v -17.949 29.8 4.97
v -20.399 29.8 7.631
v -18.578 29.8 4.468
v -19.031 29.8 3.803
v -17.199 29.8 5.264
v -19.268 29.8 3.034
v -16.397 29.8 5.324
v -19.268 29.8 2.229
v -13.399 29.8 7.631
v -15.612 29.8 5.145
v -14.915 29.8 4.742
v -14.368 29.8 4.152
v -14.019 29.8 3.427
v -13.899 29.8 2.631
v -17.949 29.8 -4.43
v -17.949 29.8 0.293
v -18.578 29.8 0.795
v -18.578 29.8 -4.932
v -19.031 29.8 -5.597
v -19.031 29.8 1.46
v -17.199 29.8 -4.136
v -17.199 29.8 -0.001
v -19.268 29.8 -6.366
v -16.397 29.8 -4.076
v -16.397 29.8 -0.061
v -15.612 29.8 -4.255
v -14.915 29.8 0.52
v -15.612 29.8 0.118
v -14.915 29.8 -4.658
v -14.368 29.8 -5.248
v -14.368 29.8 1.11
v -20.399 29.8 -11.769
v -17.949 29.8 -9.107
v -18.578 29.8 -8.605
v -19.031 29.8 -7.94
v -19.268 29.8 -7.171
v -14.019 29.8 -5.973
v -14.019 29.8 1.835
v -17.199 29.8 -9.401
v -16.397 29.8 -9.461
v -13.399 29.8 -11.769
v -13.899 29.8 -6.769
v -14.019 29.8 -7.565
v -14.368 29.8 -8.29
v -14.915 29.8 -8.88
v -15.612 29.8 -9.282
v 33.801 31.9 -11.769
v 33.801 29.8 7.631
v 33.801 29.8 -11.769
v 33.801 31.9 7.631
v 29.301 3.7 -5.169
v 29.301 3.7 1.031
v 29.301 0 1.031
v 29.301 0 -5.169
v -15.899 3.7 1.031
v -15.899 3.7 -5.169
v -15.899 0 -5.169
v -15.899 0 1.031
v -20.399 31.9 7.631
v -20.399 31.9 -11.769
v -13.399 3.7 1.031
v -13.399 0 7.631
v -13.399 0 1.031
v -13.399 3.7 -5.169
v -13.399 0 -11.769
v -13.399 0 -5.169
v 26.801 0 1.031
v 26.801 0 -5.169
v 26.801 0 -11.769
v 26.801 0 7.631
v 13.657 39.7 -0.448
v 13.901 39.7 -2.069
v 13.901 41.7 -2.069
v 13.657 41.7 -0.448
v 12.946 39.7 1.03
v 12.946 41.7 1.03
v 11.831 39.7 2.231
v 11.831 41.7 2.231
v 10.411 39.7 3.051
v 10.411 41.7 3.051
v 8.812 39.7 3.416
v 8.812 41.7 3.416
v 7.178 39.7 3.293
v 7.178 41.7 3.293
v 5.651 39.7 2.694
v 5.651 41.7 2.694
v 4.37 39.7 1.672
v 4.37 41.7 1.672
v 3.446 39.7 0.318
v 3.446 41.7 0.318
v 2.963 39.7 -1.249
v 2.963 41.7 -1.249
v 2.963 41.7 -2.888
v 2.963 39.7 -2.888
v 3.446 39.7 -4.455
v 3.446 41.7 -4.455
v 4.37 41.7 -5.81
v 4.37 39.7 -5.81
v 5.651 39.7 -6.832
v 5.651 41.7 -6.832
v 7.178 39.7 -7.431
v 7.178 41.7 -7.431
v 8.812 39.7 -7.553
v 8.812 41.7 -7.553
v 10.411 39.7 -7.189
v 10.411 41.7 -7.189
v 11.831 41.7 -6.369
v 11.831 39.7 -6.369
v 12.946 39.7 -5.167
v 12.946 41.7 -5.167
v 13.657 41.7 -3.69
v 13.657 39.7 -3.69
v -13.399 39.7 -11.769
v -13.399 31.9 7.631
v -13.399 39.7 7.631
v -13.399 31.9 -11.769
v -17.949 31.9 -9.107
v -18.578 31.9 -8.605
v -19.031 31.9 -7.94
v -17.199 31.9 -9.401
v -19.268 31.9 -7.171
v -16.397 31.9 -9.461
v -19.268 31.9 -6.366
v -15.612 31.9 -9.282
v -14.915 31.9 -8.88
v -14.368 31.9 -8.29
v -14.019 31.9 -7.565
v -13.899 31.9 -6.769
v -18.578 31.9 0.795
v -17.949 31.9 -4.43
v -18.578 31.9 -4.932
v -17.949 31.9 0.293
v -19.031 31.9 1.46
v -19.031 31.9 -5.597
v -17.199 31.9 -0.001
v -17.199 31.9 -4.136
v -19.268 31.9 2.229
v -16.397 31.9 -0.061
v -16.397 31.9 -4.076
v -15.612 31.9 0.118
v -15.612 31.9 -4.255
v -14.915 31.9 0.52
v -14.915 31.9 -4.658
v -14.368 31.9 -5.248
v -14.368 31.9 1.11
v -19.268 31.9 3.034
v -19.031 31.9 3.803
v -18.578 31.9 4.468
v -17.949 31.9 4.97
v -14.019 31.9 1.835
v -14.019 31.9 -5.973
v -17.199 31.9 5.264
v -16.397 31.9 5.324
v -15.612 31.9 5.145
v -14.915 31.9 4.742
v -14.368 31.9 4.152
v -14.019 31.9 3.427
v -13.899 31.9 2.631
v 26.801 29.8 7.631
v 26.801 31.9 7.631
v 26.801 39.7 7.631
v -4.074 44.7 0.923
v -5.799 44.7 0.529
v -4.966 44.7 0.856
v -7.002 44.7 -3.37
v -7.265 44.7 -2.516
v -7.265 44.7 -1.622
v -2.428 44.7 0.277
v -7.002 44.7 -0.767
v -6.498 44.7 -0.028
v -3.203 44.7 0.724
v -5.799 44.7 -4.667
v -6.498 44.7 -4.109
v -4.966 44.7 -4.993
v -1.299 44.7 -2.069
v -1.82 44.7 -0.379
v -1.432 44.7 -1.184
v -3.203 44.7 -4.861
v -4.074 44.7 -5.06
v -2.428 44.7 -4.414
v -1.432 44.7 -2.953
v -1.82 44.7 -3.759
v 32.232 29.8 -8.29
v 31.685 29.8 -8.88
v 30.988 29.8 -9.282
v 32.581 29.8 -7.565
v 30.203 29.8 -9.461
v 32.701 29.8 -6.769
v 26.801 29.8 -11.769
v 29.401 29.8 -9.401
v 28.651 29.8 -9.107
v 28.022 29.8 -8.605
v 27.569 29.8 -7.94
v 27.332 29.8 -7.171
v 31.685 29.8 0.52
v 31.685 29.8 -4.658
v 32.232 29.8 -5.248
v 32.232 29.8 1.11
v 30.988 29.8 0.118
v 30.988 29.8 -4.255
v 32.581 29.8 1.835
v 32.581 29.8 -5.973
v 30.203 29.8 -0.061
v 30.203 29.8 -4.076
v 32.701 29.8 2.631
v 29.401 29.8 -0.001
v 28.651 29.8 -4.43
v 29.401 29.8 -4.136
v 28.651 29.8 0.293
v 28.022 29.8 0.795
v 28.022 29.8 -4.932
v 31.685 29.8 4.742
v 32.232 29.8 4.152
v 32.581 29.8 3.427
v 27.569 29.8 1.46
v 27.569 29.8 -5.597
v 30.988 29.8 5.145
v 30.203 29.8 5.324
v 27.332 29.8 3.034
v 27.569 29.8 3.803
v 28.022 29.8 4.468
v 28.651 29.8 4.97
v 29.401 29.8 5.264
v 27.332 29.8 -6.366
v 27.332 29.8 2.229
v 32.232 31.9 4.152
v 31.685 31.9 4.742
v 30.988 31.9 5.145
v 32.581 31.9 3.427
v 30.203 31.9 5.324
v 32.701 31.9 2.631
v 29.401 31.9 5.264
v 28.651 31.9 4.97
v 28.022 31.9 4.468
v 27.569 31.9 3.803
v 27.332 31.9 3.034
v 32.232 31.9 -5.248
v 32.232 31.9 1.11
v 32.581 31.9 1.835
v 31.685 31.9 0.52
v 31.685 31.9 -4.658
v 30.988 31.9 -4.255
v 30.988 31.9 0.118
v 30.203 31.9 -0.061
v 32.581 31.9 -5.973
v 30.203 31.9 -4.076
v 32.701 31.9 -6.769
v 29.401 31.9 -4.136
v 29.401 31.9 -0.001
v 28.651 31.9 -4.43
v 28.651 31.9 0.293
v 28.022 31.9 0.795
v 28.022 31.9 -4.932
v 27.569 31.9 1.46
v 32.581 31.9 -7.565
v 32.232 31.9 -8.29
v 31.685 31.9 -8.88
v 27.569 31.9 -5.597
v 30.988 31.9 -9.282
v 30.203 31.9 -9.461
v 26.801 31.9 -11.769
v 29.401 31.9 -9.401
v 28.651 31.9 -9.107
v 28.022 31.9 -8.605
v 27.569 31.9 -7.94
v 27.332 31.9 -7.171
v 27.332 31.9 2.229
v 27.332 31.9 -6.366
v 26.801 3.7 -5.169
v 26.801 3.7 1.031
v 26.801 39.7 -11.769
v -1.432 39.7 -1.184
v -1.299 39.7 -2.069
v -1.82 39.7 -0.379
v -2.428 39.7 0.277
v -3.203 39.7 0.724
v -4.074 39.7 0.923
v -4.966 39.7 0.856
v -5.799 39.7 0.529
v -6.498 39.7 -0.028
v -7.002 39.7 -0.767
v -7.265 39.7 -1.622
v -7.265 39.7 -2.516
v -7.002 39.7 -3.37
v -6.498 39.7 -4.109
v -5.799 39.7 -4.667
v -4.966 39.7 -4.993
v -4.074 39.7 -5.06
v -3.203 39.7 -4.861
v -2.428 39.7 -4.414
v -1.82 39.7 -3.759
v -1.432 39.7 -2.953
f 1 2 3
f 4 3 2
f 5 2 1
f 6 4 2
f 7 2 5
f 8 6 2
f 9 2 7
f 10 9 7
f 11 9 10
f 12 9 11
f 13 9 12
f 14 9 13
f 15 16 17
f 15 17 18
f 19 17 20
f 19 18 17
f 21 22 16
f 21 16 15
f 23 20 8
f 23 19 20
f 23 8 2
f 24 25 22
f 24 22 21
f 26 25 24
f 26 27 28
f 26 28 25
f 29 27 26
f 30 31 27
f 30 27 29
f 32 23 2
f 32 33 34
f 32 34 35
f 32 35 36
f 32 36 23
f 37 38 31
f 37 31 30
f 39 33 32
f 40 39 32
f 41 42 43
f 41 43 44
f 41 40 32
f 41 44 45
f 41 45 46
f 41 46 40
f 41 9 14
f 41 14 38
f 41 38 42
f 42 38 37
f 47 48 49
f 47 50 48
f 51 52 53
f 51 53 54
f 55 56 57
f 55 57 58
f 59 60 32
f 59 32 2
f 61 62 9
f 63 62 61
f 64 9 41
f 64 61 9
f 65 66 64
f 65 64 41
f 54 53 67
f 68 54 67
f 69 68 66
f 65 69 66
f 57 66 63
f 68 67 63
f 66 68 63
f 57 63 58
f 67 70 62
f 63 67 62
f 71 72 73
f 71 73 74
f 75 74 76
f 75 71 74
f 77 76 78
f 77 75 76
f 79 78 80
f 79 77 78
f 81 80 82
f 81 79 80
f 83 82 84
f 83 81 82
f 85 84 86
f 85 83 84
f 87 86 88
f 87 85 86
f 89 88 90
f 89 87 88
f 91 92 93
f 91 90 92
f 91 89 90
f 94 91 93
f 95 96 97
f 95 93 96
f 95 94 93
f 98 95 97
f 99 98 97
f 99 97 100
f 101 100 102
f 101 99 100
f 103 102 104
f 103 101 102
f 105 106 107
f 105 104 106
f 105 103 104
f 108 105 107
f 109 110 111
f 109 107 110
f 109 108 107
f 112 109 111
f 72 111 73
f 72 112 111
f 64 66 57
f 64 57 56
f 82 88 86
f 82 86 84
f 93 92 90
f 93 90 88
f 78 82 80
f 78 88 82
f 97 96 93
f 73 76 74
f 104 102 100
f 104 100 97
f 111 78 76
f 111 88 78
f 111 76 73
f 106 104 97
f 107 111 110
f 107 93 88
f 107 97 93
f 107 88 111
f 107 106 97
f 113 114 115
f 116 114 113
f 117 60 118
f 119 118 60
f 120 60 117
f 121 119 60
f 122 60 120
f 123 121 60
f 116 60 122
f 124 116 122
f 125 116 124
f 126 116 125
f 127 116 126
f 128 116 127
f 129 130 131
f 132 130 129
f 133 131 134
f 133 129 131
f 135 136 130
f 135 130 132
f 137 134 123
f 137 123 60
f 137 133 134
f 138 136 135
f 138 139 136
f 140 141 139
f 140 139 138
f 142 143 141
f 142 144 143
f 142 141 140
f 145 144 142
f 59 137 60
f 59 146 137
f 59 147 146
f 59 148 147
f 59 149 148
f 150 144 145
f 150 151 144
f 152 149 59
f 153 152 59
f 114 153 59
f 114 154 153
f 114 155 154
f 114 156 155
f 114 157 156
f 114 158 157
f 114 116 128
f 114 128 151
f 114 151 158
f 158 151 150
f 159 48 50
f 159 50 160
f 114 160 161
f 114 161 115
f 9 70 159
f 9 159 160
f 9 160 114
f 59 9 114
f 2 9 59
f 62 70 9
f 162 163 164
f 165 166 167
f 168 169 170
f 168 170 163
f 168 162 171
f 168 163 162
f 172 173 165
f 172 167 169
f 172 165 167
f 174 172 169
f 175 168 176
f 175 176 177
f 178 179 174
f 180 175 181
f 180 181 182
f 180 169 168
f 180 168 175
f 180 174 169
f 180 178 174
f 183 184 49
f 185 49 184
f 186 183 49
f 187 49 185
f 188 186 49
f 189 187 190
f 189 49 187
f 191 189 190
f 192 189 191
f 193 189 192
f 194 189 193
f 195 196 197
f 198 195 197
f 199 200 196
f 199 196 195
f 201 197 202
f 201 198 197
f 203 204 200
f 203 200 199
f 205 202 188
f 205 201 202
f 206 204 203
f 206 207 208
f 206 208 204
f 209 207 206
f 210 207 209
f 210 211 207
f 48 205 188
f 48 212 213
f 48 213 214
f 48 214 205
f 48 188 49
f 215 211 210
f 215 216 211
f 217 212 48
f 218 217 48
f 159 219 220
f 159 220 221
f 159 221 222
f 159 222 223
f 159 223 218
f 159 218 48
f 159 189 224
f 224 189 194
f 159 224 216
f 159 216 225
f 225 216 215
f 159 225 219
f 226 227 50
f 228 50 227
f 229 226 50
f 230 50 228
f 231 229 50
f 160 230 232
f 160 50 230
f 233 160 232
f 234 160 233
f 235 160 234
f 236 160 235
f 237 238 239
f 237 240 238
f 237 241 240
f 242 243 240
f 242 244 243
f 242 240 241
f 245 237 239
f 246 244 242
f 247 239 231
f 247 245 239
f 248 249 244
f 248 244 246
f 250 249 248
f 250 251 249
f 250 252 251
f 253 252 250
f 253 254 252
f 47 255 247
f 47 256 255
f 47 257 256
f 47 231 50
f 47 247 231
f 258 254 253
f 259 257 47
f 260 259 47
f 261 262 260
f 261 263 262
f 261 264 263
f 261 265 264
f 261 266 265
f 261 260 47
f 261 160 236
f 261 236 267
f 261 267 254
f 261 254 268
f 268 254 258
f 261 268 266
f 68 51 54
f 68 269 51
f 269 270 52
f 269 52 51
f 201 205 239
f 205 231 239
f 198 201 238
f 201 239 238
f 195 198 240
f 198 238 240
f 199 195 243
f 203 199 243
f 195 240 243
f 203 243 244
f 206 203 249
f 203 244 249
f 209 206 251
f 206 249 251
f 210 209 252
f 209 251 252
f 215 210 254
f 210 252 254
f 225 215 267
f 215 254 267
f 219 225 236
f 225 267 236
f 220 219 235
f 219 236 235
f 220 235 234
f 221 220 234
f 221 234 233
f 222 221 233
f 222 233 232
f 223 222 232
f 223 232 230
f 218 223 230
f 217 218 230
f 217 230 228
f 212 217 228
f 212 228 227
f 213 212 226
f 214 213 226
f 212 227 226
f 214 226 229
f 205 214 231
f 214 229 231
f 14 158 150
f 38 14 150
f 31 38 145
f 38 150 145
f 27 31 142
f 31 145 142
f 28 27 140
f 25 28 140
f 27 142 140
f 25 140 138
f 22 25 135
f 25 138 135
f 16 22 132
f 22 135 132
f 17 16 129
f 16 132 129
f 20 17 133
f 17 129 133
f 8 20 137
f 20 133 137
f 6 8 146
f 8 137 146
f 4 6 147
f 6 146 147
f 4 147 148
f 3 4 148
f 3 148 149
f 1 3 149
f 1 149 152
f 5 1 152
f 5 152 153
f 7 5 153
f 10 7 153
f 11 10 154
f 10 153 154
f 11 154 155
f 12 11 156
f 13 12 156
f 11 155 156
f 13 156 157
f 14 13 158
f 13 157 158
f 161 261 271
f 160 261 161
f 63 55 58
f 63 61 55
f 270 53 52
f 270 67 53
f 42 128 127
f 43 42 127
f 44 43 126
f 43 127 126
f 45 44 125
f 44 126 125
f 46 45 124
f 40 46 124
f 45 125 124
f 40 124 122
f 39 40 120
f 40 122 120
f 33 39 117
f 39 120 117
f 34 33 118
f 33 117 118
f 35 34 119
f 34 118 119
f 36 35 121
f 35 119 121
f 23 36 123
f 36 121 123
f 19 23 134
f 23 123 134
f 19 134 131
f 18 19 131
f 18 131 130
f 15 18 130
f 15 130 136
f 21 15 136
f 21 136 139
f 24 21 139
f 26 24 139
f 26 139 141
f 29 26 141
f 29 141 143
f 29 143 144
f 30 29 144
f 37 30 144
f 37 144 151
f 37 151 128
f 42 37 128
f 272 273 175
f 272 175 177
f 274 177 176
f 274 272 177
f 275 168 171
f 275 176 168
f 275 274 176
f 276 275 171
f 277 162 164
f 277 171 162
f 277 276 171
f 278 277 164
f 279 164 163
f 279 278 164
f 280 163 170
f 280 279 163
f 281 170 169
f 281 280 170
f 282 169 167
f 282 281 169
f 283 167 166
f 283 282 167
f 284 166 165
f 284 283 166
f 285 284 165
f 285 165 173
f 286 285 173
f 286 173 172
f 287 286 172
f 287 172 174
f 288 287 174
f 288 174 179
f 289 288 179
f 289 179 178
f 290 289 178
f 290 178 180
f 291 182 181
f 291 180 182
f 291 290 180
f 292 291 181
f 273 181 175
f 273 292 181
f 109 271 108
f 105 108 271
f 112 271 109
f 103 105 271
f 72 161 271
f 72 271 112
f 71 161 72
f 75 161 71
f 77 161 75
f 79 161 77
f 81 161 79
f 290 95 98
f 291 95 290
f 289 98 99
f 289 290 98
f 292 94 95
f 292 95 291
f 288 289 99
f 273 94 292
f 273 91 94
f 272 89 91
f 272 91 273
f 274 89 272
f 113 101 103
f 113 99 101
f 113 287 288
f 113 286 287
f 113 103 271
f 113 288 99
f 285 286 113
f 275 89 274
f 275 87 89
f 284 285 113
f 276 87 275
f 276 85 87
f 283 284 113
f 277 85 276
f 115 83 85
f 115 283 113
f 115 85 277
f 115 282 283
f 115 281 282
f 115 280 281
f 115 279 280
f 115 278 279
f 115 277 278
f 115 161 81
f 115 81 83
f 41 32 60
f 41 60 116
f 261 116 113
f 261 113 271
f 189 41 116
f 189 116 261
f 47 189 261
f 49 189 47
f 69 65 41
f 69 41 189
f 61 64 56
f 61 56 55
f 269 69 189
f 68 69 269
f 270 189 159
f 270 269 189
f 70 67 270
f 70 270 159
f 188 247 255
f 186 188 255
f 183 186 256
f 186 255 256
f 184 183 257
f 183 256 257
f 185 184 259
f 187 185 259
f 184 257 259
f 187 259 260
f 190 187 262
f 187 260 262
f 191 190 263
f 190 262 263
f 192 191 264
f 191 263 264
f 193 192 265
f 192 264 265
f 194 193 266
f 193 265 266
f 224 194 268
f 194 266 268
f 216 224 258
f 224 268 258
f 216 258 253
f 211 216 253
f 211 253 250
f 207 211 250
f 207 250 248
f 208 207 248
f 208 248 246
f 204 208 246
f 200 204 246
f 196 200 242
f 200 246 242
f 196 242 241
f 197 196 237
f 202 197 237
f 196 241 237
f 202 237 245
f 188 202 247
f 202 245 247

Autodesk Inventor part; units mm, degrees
ref_plane "YZ Plane" through (0, 0, 0) normal (1, 0, 0) x (0, 1, 0)
ref_plane "XZ Plane" through (0, 0, 0) normal (0, 1, 0) x (-1, 0, 0)
ref_plane "XY Plane" through (0, 0, 0) normal (0, 0, 1) x (1, 0, 0)
sketch "Sketch1" plane through (0, 0, 0) normal (0, 1, 0) x (-1, 0, 0)
  line L0 (13.3986, -11.7687) -> (-26.8014, -11.7687)
  line L1 (-26.8014, -11.7687) -> (-26.8014, 7.6313)
  line L2 (-26.8014, 7.6313) -> (13.3986, 7.6313)
  line L3 (13.3986, 7.6313) -> (13.3986, -11.7687)
  point P0 (0, 0)
  dimension "d0" = 19.4
  dimension "d1" = 40.2
extrude "Extrusion1" add sketch "Sketch1" along normal blind 39.7
sketch "Sketch2" plane through (26.8014, 0, 7.6313) normal (1, 0, 0) x (0, 0, -1)
  line L0 (6.6, 3.7) -> (12.8, 3.7)
  line L1 (12.8, 3.7) -> (12.8, 0)
  line L2 (12.8, 0) -> (6.6, 0)
  line L3 (6.6, 0) -> (6.6, 3.7)
  line L4 (19.4, 0) -> (19.4, 39.7) projected
  line L5 (0, 0) -> (0, 39.7) projected
  line L6 (0, 0) -> (19.4, 0) projected
  point P0 (7.6313, 0)
  point P1 (12.8, 1.85)
  point P2 (6.6, 1.85)
  dimension "d4" = 6.2
  dimension "d5" = 3.7
  dimension "d6" = 6.6
  dimension "d7" = 6.6
  dimension "d8" = 0
extrude "Extrusion2" add sketch "Sketch2" along normal blind 2.5
sketch "Sketch5" plane through (-13.3986, 0, -11.7687) normal (-1, 0, 0) x (0, 0, 1)
  line L0 (6.6, 3.7) -> (12.8, 3.7) projected
  line L1 (6.6, 3.7) -> (12.8, 3.7)
  line L2 (12.8, 3.7) -> (12.8, 0)
  line L3 (12.8, 0) -> (6.6, 0)
  line L4 (6.6, 0) -> (6.6, 3.7)
  point P0 (11.7687, 0)
extrude "Extrusion3" add sketch "Sketch5" along normal blind 2.5
sketch "Sketch6" plane through (26.8014, 0, -11.7687) normal (1, 0, 0) x (0, 0, -1)
  line L0 (-19.4, 0) -> (-19.4, 39.7) projected
  line L1 (0, 0) -> (0, 39.7) projected
  line L2 (-19.4, 31.9) -> (0, 31.9)
  line L3 (0, 31.9) -> (0, 29.8)
  line L4 (0, 29.8) -> (-19.4, 29.8)
  line L5 (-19.4, 29.8) -> (-19.4, 31.9)
  line L6 (-19.4, 39.7) -> (0, 39.7) projected
  point P0 (-11.7687, 0)
  point P1 (0, 31.9)
  dimension "d13" = 2.1
  dimension "d14" = 7.8
extrude "Extrusion4" add sketch "Sketch6" along normal blind 7 contours L0 L2 L1 L4
sketch "Sketch7" plane through (-13.3986, 0, 7.6313) normal (-1, 0, 0) x (0, 0, 1)
  line L0 (-19.4, 29.8) -> (-19.4, 31.9) projected
  line L1 (-19.4, 29.8) -> (-19.4, 31.9)
  line L2 (0, 31.9) -> (0, 29.8) projected
  line L3 (-19.4, 31.9) -> (0, 31.9)
  line L4 (0, 31.9) -> (0, 29.8)
  line L5 (0, 29.8) -> (-19.4, 29.8)
  point P0 (-7.6313, 0)
extrude "Extrusion5" add sketch "Sketch7" along normal blind 7
sketch "Sketch8" plane through (0, 39.7, 0) normal (0, 1, 0) x (1, 0, 0)
  circle A0 centre (8.4014, 2.0687) radius 5.5
  line L0 (26.8014, -7.6313) -> (26.8014, 11.7687) projected
  line L1 (26.8014, 11.7687) -> (-13.3986, 11.7687) projected
  point P0 (0, 0)
  dimension "d19" = 11
  dimension "d20" = 18.4
  dimension "d23" = 9.7
extrude "Extrusion6" add sketch "Sketch8" along normal blind 2
sketch "Sketch10" plane through (0, 39.7, 0) normal (0, 1, 0) x (1, 0, 0)
  circle A0 centre (-4.2986, 2.0687) radius 3
  line L0 (-13.3986, 11.7687) -> (-13.3986, -7.6313) projected
  point P0 (0, 0)
  dimension "d26" = 6
  dimension "d27" = 9.1
extrude "Extrusion7" add sketch "Sketch10" along normal blind 5
sketch "Sketch11" plane through (26.8014, 31.9, 7.6313) normal (0, 1, 0) x (1, 0, 0)
  circle A0 centre (3.2, 5) radius 2.7
  line L0 (0, 0) -> (7, 0) projected
  circle A1 centre (3.2, 14.4) radius 2.7
  line L1 (0, 19.4) -> (7, 19.4) projected
  line L2 (0, 0) -> (0, 19.4) projected
  line L3 (7, 19.4) -> (7, 0) projected
  point P0 (-26.8014, 7.6313)
  dimension "d30" = 5.4
  dimension "d31" = 5
  dimension "d32" = 5
  dimension "d33" = 5.4
  dimension "d38" = 3.8
  dimension "d39" = 3.8
extrude "Extrusion8" cut sketch "Sketch11" against normal blind 5 contours A0 | A1
sketch "Sketch12" plane through (-13.3986, 31.9, 7.6313) normal (0, 1, 0) x (1, 0, 0)
  circle A0 centre (-3.2, 14.4) radius 2.7
  circle A1 centre (-3.2, 5) radius 2.7
  line L0 (0, 0) -> (-7, 0) projected
  line L1 (0, 19.4) -> (-7, 19.4) projected
  line L2 (-7, 0) -> (-7, 19.4) projected
  point P0 (13.3986, 7.6313)
  dimension "d42" = 5.4
  dimension "d43" = 5.4
  dimension "d44" = 5
  dimension "d45" = 5
  dimension "d46" = 3.8
  dimension "d47" = 3.8
extrude "Extrusion9" cut sketch "Sketch12" against normal blind 7
equation "\"d31\" = d32"
equation "\"d33\" = d30"
equation "\"d39\" = d38"
equation "\"d43\" = d42"
equation "\"d45\" = d44"
equation "\"d47\" = d46"
properties part number "Servo"
